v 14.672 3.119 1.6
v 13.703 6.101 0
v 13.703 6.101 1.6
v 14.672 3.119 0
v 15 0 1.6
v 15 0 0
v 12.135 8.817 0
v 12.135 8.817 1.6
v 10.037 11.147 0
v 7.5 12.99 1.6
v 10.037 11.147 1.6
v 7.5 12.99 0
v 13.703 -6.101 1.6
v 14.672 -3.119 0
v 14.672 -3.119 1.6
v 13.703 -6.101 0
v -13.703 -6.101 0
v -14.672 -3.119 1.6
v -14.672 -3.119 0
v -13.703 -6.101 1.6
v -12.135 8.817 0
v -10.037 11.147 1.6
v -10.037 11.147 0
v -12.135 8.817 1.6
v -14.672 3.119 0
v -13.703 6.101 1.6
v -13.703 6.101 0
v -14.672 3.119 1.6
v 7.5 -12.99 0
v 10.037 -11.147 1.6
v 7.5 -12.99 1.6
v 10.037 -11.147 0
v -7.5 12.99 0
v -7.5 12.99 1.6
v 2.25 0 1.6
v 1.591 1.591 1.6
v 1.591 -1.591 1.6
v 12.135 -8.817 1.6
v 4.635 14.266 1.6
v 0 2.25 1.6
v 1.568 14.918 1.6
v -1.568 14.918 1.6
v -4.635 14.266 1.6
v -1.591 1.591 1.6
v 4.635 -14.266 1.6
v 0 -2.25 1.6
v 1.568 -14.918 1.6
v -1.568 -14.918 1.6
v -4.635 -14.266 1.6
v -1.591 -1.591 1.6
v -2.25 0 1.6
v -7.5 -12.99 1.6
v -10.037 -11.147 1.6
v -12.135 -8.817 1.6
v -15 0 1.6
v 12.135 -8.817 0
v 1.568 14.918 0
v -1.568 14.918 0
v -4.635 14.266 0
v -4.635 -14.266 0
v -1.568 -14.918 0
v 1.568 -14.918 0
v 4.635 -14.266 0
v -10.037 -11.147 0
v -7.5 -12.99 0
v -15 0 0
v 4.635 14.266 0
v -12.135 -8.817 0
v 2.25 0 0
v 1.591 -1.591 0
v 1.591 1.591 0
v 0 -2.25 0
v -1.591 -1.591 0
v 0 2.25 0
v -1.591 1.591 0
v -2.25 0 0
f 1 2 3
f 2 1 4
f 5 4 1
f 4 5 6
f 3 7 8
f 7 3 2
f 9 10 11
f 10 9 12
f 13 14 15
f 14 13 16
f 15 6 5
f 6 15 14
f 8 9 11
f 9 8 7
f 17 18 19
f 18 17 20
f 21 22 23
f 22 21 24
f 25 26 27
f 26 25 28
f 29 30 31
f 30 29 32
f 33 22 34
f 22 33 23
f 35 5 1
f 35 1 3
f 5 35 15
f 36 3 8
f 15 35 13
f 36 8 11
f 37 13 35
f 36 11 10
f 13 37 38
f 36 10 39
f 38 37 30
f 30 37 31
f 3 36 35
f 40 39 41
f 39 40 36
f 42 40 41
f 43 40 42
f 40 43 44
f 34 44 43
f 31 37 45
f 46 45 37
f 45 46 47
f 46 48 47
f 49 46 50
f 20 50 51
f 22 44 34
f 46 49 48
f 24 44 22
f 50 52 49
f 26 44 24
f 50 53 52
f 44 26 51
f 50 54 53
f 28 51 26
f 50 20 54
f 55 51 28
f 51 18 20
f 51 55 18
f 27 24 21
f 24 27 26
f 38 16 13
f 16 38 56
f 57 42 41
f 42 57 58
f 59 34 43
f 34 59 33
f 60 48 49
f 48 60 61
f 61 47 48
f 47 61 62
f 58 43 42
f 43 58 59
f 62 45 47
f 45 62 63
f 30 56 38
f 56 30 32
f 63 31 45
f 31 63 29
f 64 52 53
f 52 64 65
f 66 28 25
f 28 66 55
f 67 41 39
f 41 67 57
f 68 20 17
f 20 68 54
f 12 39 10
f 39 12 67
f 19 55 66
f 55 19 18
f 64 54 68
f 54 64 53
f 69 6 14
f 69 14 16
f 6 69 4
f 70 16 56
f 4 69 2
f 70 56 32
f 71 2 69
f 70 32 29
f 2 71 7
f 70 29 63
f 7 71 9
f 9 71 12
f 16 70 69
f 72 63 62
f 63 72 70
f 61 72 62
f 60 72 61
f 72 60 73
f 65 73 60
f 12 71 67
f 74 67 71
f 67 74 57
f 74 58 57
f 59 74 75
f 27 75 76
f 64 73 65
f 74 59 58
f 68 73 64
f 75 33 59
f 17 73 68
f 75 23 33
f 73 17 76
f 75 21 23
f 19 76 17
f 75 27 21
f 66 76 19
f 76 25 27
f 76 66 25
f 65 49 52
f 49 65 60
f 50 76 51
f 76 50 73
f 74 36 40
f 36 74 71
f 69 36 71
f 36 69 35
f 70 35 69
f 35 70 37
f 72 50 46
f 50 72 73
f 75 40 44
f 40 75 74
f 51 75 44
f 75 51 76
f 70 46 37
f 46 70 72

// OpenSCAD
module ring(od,id,thk)
{
    difference()
    {
        cylinder(d=od,h=thk);
        cylinder(d=id,h=thk);
    }
}

ring(30,4.5,1.6);
